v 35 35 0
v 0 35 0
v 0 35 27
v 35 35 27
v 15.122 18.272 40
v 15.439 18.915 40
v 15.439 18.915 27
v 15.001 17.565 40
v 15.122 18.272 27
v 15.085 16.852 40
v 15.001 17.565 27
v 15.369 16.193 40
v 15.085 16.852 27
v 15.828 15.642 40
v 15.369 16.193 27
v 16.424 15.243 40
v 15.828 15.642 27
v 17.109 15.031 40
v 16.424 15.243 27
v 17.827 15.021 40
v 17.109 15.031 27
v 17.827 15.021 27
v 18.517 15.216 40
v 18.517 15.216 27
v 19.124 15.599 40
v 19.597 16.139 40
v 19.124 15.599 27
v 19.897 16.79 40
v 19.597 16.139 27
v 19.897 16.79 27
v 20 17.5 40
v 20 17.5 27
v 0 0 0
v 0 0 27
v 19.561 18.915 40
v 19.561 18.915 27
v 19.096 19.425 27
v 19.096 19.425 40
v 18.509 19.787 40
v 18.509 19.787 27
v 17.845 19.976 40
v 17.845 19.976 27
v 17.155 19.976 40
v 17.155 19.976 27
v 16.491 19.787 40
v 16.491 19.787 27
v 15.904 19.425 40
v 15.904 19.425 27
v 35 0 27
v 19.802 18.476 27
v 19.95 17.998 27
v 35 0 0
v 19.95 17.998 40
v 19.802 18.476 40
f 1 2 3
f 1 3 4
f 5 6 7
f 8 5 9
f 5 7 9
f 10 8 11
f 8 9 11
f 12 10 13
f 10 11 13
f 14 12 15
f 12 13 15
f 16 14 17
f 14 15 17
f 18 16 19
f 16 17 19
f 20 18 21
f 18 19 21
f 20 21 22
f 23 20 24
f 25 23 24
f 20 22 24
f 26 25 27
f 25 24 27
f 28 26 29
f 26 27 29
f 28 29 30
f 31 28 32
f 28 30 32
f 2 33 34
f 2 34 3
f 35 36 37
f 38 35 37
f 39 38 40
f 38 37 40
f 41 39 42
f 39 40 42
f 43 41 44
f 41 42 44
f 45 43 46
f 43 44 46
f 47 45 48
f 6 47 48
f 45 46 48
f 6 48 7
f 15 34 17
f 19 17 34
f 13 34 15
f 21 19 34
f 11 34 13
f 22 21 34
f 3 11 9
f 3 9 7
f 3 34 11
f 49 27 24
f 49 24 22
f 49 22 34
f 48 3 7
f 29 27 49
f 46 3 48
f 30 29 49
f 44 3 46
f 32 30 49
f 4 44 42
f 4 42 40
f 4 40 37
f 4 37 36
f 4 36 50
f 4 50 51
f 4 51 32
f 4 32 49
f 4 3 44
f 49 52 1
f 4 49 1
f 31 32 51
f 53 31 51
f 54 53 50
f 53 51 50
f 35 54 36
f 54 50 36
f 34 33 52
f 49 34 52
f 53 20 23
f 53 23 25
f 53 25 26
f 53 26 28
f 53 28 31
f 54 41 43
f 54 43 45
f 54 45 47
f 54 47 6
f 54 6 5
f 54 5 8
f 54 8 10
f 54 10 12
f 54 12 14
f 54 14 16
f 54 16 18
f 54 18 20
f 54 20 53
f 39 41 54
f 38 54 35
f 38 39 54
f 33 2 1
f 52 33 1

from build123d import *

# Parameters (mm, degrees)
SKETCH1_W           = 35
SKETCH1_H           = 35
BOSS_EXTRUDE1_DEPTH = 27
SKETCH1_3_R         = 2.5
BOSS_EXTRUDE2_DEPTH = 40


with BuildPart() as part:
    # Sketch1 → Boss-Extrude1 (new body)
    with BuildSketch(Plane.XY):
        with Locations((17.5, 17.5)):
            Rectangle(SKETCH1_W, SKETCH1_H)
    extrude(amount=BOSS_EXTRUDE1_DEPTH)

    # Sketch1<3> → Boss-Extrude2 (add)
    with BuildSketch(Plane.XY):
        with Locations((17.5, 17.5)):
            Circle(SKETCH1_3_R)
    extrude(amount=BOSS_EXTRUDE2_DEPTH)


solid = part.part
